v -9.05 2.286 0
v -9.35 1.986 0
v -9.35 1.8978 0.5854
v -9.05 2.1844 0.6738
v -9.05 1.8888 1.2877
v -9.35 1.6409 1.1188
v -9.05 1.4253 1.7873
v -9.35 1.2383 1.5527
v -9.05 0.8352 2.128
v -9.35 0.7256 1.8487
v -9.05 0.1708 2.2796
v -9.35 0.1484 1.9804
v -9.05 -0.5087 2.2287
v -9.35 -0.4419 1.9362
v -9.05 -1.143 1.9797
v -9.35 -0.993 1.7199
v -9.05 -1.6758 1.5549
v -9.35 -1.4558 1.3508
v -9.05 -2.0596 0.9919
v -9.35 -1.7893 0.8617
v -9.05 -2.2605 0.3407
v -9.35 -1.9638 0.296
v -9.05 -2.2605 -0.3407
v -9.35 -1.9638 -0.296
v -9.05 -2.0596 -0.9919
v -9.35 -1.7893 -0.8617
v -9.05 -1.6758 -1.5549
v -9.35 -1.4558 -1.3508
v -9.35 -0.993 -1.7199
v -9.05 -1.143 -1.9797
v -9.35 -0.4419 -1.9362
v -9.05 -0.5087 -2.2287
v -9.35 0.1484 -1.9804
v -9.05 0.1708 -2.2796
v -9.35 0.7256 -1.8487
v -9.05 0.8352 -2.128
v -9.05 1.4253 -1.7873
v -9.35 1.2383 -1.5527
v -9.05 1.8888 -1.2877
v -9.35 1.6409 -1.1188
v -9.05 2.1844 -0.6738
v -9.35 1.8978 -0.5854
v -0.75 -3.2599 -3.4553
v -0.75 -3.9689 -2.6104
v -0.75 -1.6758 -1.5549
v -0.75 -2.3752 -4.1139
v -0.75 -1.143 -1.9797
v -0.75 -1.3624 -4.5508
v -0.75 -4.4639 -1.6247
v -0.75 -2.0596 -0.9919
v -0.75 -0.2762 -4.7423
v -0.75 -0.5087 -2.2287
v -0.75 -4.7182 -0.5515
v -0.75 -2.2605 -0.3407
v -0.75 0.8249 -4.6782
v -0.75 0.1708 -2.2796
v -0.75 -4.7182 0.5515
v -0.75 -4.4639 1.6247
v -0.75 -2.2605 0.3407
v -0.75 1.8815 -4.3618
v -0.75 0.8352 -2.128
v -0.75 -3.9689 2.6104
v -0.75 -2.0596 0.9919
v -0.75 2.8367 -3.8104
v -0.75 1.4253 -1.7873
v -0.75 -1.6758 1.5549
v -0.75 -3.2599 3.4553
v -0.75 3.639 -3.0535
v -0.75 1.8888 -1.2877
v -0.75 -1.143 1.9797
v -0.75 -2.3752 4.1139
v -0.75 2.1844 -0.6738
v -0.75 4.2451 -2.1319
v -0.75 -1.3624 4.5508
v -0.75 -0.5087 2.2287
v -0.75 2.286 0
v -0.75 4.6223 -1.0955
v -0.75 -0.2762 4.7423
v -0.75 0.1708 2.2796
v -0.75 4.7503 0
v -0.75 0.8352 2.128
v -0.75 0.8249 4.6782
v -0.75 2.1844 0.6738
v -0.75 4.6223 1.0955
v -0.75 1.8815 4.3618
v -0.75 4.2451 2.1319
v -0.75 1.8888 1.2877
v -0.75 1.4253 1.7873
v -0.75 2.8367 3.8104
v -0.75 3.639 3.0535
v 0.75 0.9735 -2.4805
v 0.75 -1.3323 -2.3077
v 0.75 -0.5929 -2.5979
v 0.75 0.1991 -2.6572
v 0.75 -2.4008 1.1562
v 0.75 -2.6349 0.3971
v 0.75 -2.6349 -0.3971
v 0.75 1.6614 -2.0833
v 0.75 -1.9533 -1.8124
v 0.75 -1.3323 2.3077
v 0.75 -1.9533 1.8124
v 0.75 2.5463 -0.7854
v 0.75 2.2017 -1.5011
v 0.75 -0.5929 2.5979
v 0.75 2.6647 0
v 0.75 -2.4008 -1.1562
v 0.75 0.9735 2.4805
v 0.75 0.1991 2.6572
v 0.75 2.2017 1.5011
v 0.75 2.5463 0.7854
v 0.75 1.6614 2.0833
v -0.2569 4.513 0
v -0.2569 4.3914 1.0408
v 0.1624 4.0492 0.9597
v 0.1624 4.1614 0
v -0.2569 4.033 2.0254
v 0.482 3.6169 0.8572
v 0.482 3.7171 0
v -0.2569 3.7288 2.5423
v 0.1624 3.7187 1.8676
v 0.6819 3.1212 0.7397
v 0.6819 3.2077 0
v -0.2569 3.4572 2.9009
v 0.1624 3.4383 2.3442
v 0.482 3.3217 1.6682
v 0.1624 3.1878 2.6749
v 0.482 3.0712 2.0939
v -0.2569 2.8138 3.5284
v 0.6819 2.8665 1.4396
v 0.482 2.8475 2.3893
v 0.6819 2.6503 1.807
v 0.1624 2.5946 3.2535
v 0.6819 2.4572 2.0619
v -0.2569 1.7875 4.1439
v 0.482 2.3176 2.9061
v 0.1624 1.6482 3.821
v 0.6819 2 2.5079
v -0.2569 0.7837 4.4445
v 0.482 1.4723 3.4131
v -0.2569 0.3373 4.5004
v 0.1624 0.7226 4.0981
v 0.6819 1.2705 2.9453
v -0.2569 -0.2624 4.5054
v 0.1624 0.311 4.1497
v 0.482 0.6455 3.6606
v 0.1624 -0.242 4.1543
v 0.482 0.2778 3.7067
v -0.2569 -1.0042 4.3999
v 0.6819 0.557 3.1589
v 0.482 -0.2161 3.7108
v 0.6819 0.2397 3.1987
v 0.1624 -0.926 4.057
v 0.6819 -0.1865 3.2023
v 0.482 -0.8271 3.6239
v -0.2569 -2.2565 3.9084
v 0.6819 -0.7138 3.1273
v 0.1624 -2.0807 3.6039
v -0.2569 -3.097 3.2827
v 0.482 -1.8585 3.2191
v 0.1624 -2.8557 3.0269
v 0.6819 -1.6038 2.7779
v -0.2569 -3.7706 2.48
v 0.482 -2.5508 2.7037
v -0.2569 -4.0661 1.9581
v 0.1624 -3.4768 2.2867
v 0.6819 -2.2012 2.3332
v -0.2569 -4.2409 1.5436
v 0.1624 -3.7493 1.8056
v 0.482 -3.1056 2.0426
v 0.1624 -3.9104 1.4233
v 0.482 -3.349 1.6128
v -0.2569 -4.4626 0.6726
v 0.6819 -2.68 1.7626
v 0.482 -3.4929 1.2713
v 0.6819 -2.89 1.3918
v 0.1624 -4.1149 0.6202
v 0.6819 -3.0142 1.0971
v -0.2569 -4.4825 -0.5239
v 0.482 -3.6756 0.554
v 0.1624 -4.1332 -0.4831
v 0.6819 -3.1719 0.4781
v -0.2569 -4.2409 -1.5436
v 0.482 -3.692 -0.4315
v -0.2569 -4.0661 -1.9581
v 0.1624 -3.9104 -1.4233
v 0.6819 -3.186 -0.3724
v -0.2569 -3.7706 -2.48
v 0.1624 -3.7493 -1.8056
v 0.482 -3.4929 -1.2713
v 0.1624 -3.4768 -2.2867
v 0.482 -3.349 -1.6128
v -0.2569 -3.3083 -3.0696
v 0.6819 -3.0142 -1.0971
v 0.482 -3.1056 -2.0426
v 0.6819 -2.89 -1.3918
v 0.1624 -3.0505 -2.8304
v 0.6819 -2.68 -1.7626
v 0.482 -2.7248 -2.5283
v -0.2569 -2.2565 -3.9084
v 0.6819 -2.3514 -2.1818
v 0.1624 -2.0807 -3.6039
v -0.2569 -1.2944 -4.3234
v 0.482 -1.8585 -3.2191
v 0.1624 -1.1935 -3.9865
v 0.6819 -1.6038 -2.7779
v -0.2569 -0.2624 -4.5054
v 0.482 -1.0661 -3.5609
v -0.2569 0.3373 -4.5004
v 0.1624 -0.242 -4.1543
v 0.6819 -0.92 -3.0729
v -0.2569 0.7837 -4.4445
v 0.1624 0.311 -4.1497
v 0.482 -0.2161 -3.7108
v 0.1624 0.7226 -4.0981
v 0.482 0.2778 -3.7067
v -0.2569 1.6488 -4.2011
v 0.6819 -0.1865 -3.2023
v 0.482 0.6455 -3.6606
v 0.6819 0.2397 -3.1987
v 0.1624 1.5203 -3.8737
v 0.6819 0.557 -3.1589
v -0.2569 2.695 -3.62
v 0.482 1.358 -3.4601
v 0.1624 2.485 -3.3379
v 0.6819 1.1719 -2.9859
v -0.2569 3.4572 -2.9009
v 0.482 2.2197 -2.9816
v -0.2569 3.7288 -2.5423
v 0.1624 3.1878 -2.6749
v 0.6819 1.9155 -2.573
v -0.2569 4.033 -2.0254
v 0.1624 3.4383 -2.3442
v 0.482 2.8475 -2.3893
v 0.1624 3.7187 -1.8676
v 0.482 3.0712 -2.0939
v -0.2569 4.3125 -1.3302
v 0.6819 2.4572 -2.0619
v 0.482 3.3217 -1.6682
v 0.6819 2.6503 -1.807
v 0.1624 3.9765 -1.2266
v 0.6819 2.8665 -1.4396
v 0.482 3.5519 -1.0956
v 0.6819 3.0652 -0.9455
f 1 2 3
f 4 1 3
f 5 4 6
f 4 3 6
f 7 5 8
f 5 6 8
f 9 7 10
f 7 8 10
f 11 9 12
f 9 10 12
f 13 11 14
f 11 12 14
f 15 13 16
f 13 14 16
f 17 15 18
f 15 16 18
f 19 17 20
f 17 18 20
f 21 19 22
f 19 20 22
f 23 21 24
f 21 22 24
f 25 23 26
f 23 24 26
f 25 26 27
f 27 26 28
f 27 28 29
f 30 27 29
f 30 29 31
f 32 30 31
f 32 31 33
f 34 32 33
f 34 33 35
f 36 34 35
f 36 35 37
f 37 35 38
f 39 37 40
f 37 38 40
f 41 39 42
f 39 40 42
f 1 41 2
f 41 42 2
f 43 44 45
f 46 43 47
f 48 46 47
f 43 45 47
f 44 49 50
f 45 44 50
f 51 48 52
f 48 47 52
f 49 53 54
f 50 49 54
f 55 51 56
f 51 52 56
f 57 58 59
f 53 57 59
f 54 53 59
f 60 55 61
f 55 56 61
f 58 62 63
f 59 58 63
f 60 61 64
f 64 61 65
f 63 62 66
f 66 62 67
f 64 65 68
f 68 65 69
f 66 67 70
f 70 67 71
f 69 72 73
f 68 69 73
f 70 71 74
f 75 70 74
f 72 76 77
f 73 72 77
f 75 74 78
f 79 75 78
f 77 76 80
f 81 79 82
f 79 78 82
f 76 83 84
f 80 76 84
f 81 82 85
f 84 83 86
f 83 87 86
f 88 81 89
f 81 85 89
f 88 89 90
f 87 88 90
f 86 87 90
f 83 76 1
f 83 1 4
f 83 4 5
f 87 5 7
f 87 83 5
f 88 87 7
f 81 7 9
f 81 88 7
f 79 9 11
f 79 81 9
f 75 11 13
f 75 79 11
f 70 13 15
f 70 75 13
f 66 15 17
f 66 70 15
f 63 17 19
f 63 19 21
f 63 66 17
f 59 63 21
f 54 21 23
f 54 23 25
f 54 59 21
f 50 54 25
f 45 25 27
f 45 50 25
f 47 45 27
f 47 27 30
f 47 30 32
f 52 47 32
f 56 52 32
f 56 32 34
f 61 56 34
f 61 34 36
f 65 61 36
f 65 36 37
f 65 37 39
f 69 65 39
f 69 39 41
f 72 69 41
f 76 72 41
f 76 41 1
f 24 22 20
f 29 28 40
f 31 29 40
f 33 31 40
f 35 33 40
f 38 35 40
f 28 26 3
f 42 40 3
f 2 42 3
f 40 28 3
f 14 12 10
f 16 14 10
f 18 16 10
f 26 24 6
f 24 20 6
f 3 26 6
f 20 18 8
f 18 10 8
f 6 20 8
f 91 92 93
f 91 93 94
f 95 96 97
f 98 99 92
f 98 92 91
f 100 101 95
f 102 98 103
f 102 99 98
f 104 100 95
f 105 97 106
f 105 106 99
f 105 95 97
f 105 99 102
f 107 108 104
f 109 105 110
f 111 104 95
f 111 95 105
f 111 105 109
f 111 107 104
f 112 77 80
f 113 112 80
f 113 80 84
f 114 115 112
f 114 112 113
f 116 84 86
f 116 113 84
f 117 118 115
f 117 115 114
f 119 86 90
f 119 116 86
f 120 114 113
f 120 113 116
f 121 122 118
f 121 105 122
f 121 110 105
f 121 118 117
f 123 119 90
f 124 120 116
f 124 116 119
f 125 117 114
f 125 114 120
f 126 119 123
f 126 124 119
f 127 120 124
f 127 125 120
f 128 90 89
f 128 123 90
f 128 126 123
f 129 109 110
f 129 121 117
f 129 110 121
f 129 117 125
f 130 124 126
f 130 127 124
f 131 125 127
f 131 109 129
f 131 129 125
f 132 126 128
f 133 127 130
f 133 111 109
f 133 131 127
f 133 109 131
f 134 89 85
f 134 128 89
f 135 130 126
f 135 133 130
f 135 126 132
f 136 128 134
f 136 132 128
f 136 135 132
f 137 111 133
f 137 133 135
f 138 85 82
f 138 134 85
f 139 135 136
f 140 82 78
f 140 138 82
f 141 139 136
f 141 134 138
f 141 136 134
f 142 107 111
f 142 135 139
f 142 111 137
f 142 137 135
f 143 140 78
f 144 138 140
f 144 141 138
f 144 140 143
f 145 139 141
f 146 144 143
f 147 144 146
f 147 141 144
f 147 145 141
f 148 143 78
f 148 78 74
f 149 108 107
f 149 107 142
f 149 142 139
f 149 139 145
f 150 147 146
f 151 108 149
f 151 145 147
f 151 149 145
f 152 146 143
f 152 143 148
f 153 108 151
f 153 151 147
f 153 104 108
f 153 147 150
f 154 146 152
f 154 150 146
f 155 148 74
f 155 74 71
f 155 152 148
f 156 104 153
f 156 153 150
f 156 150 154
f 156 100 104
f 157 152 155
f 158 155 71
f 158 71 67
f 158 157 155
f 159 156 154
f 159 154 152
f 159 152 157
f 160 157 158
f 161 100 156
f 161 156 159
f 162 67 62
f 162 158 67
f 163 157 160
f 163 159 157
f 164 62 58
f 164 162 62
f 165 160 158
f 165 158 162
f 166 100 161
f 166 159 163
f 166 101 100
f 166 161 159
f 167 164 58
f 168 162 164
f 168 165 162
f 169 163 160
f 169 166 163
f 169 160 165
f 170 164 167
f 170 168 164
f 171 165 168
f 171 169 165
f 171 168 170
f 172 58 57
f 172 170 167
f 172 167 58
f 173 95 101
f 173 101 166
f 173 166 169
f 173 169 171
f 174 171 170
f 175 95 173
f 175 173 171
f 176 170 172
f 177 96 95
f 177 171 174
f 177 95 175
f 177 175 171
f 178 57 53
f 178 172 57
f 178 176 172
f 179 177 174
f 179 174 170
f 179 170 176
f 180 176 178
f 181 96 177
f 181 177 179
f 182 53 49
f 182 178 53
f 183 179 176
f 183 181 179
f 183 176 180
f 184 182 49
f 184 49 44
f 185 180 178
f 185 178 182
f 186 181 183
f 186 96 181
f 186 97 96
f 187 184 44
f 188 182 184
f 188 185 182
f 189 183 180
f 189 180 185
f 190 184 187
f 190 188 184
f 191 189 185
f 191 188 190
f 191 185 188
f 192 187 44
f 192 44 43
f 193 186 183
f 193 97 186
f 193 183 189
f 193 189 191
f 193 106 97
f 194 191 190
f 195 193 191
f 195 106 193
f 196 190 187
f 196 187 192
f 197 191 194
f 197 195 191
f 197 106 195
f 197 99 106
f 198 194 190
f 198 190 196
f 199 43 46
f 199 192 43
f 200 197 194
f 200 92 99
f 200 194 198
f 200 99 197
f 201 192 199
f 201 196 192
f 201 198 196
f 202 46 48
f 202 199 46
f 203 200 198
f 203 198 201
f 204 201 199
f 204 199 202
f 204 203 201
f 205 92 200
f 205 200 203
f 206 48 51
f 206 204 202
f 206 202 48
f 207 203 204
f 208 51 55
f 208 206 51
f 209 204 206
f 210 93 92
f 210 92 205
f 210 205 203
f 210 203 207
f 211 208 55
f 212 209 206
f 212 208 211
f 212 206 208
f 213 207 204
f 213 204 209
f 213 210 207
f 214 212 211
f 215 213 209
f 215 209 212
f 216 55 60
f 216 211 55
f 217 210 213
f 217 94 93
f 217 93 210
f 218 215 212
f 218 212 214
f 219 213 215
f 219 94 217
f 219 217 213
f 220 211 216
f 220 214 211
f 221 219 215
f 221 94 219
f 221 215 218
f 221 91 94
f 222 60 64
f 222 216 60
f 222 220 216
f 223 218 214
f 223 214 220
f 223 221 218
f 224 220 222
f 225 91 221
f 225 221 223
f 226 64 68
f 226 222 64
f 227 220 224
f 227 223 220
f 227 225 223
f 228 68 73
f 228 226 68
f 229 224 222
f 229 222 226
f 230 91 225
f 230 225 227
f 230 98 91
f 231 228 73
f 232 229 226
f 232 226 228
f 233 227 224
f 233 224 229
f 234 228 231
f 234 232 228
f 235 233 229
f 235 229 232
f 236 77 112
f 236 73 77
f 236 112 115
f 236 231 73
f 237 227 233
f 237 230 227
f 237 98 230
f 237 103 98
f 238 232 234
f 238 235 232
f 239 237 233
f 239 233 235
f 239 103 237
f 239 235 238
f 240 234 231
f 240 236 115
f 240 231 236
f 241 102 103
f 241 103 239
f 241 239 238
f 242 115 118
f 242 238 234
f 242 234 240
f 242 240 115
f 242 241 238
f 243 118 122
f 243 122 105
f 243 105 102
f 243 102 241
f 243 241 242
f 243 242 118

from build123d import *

# Parameters (mm, degrees)
F6_R           = 2.286
F8_DEPTH       = 9.35
F9_SIZE        = 0.3
F10_R          = 4.7503425206
F11_DEPTH      = 0.75
F11_DEPTH_BACK = 0.75


# Not quite as in the source:
# - a fillet or chamfer that OpenCascade refuses, or shapes differently, is made with other operations: its cross-section is extruded or revolved along the edge and cut away or added
# - the program builds the solid bodies; features that only make, move or delete a surface that nothing else refers to are left out


with BuildPart() as f8:
    # F6 (on Right) → F8 (new body)
    with BuildSketch(Plane.YZ):
        Circle(F6_R)
    extrude(amount=-F8_DEPTH)

    # F9
    f9_edges = [f8.edges().sort_by_distance(p)[0] for p in [
        (-9.35, -2.286, 0),
    ]]
    chamfer(f9_edges, length=F9_SIZE)

    # F10 (on Right) → F11 (join, two sides)
    with BuildSketch(Plane.YZ) as f11_sk:
        Circle(F10_R)
    extrude(amount=F11_DEPTH)
    extrude(f11_sk.sketch, amount=-F11_DEPTH_BACK)

    # F12: fillet of radius 2.2 on 1 edges, made by hand

    # F12_s1 → F12_t2 (revolve, cut)
    with BuildSketch(Plane.XY):
        with BuildLine():
            ThreePointArc((-0.75, 4.7503425206), (0.3360571099, 3.949200417), (0.75, 2.6646771591))
            Line((0.75, 2.6646771591), (0.75, 4.7503425206))
            Line((0.75, 4.7503425206), (-0.75, 4.7503425206))
        make_face()
    revolve(axis=Axis((0.75, 0, 0), (1, 0, 0)), mode=Mode.SUBTRACT)


solid = f8.part
